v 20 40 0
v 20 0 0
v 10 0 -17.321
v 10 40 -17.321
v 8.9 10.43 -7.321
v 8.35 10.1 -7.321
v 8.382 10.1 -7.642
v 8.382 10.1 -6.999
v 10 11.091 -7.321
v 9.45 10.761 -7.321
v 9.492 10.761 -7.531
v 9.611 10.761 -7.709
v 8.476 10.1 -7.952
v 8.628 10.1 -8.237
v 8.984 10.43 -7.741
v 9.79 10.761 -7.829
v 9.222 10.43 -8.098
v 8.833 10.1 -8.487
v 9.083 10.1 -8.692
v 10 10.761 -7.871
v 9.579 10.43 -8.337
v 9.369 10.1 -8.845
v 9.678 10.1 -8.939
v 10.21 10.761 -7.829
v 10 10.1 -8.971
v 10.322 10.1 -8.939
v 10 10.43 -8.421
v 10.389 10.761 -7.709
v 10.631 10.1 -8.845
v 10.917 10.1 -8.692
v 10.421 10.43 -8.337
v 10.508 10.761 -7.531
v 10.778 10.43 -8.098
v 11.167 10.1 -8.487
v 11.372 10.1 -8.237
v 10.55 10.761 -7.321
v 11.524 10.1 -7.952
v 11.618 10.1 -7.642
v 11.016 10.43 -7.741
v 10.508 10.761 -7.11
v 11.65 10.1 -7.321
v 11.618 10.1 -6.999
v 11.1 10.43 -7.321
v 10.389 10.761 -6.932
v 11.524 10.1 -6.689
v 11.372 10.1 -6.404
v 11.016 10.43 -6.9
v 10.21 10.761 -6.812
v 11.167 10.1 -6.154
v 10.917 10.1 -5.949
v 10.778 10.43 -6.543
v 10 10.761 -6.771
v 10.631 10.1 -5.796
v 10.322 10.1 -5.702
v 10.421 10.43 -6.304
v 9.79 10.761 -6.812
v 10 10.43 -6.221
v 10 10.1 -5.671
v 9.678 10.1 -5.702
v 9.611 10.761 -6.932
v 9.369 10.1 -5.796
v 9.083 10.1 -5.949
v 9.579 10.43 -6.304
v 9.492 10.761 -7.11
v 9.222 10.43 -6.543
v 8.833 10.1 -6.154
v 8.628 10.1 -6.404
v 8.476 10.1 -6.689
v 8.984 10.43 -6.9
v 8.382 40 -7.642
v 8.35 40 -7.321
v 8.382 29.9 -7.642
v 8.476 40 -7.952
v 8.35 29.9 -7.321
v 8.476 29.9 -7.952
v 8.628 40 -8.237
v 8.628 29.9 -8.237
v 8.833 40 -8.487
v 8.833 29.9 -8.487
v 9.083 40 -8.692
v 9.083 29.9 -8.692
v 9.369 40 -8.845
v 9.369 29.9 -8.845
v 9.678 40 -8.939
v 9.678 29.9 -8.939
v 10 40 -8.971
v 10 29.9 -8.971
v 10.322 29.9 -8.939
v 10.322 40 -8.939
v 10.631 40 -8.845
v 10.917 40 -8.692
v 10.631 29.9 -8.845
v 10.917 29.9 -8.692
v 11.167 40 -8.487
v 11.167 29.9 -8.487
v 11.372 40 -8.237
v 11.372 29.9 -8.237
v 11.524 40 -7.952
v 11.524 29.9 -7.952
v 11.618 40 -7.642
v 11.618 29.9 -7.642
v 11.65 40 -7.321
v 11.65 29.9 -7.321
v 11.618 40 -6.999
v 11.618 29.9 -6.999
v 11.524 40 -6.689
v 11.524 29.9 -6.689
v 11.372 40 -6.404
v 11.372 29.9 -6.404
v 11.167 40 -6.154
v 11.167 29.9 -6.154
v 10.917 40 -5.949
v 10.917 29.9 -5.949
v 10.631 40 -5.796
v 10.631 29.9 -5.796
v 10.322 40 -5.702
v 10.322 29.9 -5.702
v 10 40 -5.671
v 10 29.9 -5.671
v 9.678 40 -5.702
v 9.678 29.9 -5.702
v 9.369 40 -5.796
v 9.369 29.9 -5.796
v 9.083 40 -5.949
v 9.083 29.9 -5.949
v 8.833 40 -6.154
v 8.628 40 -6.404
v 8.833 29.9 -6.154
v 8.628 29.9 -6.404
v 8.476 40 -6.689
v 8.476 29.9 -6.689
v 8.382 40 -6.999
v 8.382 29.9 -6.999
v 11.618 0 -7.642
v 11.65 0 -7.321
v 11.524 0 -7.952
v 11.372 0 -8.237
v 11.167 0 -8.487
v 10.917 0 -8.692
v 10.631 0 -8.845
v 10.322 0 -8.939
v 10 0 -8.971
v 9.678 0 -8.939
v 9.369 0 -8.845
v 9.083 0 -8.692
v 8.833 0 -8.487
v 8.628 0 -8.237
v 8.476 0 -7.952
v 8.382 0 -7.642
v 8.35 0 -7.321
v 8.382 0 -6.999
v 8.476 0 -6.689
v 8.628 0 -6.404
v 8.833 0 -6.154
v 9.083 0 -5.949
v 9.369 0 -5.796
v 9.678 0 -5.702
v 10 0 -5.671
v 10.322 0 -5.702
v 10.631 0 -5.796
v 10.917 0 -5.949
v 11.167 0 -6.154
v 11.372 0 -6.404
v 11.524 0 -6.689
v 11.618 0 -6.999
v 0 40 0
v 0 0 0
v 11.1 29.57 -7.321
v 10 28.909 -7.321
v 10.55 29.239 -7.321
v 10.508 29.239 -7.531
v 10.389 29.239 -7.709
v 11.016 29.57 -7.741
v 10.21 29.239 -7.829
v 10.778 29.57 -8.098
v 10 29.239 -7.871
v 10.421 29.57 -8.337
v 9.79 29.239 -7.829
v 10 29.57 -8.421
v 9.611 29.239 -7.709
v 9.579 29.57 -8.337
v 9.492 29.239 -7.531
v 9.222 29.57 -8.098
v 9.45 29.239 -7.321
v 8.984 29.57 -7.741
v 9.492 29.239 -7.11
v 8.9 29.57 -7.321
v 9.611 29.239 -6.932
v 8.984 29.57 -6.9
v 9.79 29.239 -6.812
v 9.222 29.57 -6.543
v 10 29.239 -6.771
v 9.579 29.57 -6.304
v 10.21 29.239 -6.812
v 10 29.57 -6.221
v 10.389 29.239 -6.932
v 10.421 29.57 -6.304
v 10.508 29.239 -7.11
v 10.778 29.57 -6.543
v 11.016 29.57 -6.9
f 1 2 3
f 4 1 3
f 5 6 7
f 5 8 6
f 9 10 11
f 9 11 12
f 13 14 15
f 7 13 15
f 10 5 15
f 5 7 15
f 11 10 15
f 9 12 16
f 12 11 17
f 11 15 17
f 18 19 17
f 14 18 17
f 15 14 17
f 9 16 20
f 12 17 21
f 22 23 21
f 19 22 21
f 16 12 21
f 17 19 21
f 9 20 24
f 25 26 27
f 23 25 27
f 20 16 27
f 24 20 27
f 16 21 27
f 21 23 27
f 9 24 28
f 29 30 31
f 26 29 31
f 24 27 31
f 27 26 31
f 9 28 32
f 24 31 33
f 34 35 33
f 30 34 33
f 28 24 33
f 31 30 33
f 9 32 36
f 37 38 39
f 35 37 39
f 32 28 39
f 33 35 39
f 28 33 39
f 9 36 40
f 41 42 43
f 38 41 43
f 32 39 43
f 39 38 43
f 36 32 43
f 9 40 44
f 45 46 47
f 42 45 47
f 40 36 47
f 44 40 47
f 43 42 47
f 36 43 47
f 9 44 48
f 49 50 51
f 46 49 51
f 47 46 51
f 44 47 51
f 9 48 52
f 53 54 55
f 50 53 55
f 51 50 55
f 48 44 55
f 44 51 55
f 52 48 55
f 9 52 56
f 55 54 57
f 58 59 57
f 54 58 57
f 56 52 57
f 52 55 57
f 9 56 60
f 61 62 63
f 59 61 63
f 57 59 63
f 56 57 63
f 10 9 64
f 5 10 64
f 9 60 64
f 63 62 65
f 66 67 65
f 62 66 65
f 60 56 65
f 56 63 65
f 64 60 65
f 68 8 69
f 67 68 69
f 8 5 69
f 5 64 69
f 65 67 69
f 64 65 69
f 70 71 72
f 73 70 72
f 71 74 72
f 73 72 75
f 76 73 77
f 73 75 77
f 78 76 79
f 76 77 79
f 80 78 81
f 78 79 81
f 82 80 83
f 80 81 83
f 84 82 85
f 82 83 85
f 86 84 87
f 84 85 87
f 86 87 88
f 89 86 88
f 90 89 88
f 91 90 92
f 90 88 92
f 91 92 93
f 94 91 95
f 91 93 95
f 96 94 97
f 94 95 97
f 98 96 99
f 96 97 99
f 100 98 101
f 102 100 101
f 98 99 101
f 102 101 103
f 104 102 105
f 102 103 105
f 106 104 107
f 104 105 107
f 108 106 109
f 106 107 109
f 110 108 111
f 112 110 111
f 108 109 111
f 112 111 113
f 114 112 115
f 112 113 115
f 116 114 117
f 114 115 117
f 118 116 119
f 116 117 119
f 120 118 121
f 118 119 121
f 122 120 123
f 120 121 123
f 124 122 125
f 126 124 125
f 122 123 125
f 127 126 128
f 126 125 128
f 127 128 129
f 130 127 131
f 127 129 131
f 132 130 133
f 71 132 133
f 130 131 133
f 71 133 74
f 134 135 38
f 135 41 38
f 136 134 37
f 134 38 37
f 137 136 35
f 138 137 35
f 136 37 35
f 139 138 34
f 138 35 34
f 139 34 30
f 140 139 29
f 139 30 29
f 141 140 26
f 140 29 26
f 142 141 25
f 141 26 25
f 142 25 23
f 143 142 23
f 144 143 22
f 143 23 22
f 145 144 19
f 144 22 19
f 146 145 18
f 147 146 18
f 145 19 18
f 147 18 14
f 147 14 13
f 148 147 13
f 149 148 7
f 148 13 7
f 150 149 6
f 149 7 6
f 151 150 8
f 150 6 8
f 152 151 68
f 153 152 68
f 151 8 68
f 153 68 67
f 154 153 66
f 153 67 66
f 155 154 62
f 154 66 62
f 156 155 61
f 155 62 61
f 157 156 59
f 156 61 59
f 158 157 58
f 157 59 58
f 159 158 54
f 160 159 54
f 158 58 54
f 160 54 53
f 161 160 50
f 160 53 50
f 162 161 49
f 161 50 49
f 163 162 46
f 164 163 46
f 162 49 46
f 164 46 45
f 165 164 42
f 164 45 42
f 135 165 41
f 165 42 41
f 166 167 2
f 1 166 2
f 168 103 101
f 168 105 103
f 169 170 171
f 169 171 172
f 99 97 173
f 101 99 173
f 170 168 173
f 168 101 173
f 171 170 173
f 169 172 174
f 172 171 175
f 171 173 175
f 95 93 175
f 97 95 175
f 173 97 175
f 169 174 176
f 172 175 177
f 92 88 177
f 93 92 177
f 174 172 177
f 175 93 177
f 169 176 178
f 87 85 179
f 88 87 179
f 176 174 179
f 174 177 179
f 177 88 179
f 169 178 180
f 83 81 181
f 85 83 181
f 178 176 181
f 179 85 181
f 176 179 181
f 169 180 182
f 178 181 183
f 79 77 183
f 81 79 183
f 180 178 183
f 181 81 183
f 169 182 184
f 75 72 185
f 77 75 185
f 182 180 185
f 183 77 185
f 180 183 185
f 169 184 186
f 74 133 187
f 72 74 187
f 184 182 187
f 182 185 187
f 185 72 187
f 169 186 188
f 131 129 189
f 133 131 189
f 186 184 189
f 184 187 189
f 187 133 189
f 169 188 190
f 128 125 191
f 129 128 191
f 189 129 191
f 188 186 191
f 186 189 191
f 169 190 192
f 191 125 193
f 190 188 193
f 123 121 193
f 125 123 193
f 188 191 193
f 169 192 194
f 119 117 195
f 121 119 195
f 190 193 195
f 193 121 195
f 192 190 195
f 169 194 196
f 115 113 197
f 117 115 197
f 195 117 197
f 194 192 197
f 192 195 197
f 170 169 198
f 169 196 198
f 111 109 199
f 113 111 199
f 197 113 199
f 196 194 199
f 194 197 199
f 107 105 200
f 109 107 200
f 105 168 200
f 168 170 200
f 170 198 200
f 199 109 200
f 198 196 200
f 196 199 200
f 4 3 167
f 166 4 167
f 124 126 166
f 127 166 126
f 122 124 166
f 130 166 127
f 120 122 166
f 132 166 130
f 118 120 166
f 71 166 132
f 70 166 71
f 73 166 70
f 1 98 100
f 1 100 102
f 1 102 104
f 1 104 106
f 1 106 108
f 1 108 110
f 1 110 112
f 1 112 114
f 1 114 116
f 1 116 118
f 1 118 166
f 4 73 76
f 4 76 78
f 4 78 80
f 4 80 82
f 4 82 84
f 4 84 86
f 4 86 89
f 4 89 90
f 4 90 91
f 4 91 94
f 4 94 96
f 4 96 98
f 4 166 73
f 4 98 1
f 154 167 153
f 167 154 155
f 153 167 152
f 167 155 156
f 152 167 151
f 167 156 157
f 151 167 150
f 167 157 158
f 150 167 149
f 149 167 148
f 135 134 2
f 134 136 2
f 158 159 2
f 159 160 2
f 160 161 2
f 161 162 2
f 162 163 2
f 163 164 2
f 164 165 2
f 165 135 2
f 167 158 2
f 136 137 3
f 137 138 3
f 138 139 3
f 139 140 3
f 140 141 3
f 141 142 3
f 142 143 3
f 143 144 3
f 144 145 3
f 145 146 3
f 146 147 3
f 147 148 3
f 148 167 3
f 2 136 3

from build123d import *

# Parameters (mm, degrees)
EXTRUDE_1_DEPTH        = 40
HOLE_WIZARD_M4_1_D     = 3.3
HOLE_WIZARD_M4_1_DEPTH = 10.1
HOLE_WIZARD_M4_1_TIP   = 0.991420021
HOLE_WIZARD_M4_2_D     = 3.3
HOLE_WIZARD_M4_2_DEPTH = 10.1
HOLE_WIZARD_M4_2_TIP   = 0.991420021


with BuildPart() as part:
    # 草图1 → 凸台-拉伸1 (new body)
    with BuildSketch(Plane(origin=(0, 0, 0), x_dir=(1, 0, 0), z_dir=(0, 1, 0))):
        Polygon((0, 0), (20, 0), (10, 17.320508076), align=None)
    extrude(amount=EXTRUDE_1_DEPTH)

    # M4 螺纹孔1
    with Locations(Plane(origin=(0, 0, 0), x_dir=(-1, 0, 0), z_dir=(0, -1, 0))):
        with Locations((-10, 7.320508076)):
            Hole(HOLE_WIZARD_M4_1_D / 2, depth=HOLE_WIZARD_M4_1_DEPTH)
            with Locations((0, 0, -(HOLE_WIZARD_M4_1_DEPTH + HOLE_WIZARD_M4_1_TIP / 2))):  # 118° drill point
                Cone(0, HOLE_WIZARD_M4_1_D / 2, HOLE_WIZARD_M4_1_TIP, mode=Mode.SUBTRACT)

    # M4 螺纹孔2
    with Locations(Plane(origin=(0, 40, 0), x_dir=(1, 0, 0), z_dir=(0, 1, 0))):
        with Locations((10, 7.320508076)):
            Hole(HOLE_WIZARD_M4_2_D / 2, depth=HOLE_WIZARD_M4_2_DEPTH)
            with Locations((0, 0, -(HOLE_WIZARD_M4_2_DEPTH + HOLE_WIZARD_M4_2_TIP / 2))):  # 118° drill point
                Cone(0, HOLE_WIZARD_M4_2_D / 2, HOLE_WIZARD_M4_2_TIP, mode=Mode.SUBTRACT)


solid = part.part
